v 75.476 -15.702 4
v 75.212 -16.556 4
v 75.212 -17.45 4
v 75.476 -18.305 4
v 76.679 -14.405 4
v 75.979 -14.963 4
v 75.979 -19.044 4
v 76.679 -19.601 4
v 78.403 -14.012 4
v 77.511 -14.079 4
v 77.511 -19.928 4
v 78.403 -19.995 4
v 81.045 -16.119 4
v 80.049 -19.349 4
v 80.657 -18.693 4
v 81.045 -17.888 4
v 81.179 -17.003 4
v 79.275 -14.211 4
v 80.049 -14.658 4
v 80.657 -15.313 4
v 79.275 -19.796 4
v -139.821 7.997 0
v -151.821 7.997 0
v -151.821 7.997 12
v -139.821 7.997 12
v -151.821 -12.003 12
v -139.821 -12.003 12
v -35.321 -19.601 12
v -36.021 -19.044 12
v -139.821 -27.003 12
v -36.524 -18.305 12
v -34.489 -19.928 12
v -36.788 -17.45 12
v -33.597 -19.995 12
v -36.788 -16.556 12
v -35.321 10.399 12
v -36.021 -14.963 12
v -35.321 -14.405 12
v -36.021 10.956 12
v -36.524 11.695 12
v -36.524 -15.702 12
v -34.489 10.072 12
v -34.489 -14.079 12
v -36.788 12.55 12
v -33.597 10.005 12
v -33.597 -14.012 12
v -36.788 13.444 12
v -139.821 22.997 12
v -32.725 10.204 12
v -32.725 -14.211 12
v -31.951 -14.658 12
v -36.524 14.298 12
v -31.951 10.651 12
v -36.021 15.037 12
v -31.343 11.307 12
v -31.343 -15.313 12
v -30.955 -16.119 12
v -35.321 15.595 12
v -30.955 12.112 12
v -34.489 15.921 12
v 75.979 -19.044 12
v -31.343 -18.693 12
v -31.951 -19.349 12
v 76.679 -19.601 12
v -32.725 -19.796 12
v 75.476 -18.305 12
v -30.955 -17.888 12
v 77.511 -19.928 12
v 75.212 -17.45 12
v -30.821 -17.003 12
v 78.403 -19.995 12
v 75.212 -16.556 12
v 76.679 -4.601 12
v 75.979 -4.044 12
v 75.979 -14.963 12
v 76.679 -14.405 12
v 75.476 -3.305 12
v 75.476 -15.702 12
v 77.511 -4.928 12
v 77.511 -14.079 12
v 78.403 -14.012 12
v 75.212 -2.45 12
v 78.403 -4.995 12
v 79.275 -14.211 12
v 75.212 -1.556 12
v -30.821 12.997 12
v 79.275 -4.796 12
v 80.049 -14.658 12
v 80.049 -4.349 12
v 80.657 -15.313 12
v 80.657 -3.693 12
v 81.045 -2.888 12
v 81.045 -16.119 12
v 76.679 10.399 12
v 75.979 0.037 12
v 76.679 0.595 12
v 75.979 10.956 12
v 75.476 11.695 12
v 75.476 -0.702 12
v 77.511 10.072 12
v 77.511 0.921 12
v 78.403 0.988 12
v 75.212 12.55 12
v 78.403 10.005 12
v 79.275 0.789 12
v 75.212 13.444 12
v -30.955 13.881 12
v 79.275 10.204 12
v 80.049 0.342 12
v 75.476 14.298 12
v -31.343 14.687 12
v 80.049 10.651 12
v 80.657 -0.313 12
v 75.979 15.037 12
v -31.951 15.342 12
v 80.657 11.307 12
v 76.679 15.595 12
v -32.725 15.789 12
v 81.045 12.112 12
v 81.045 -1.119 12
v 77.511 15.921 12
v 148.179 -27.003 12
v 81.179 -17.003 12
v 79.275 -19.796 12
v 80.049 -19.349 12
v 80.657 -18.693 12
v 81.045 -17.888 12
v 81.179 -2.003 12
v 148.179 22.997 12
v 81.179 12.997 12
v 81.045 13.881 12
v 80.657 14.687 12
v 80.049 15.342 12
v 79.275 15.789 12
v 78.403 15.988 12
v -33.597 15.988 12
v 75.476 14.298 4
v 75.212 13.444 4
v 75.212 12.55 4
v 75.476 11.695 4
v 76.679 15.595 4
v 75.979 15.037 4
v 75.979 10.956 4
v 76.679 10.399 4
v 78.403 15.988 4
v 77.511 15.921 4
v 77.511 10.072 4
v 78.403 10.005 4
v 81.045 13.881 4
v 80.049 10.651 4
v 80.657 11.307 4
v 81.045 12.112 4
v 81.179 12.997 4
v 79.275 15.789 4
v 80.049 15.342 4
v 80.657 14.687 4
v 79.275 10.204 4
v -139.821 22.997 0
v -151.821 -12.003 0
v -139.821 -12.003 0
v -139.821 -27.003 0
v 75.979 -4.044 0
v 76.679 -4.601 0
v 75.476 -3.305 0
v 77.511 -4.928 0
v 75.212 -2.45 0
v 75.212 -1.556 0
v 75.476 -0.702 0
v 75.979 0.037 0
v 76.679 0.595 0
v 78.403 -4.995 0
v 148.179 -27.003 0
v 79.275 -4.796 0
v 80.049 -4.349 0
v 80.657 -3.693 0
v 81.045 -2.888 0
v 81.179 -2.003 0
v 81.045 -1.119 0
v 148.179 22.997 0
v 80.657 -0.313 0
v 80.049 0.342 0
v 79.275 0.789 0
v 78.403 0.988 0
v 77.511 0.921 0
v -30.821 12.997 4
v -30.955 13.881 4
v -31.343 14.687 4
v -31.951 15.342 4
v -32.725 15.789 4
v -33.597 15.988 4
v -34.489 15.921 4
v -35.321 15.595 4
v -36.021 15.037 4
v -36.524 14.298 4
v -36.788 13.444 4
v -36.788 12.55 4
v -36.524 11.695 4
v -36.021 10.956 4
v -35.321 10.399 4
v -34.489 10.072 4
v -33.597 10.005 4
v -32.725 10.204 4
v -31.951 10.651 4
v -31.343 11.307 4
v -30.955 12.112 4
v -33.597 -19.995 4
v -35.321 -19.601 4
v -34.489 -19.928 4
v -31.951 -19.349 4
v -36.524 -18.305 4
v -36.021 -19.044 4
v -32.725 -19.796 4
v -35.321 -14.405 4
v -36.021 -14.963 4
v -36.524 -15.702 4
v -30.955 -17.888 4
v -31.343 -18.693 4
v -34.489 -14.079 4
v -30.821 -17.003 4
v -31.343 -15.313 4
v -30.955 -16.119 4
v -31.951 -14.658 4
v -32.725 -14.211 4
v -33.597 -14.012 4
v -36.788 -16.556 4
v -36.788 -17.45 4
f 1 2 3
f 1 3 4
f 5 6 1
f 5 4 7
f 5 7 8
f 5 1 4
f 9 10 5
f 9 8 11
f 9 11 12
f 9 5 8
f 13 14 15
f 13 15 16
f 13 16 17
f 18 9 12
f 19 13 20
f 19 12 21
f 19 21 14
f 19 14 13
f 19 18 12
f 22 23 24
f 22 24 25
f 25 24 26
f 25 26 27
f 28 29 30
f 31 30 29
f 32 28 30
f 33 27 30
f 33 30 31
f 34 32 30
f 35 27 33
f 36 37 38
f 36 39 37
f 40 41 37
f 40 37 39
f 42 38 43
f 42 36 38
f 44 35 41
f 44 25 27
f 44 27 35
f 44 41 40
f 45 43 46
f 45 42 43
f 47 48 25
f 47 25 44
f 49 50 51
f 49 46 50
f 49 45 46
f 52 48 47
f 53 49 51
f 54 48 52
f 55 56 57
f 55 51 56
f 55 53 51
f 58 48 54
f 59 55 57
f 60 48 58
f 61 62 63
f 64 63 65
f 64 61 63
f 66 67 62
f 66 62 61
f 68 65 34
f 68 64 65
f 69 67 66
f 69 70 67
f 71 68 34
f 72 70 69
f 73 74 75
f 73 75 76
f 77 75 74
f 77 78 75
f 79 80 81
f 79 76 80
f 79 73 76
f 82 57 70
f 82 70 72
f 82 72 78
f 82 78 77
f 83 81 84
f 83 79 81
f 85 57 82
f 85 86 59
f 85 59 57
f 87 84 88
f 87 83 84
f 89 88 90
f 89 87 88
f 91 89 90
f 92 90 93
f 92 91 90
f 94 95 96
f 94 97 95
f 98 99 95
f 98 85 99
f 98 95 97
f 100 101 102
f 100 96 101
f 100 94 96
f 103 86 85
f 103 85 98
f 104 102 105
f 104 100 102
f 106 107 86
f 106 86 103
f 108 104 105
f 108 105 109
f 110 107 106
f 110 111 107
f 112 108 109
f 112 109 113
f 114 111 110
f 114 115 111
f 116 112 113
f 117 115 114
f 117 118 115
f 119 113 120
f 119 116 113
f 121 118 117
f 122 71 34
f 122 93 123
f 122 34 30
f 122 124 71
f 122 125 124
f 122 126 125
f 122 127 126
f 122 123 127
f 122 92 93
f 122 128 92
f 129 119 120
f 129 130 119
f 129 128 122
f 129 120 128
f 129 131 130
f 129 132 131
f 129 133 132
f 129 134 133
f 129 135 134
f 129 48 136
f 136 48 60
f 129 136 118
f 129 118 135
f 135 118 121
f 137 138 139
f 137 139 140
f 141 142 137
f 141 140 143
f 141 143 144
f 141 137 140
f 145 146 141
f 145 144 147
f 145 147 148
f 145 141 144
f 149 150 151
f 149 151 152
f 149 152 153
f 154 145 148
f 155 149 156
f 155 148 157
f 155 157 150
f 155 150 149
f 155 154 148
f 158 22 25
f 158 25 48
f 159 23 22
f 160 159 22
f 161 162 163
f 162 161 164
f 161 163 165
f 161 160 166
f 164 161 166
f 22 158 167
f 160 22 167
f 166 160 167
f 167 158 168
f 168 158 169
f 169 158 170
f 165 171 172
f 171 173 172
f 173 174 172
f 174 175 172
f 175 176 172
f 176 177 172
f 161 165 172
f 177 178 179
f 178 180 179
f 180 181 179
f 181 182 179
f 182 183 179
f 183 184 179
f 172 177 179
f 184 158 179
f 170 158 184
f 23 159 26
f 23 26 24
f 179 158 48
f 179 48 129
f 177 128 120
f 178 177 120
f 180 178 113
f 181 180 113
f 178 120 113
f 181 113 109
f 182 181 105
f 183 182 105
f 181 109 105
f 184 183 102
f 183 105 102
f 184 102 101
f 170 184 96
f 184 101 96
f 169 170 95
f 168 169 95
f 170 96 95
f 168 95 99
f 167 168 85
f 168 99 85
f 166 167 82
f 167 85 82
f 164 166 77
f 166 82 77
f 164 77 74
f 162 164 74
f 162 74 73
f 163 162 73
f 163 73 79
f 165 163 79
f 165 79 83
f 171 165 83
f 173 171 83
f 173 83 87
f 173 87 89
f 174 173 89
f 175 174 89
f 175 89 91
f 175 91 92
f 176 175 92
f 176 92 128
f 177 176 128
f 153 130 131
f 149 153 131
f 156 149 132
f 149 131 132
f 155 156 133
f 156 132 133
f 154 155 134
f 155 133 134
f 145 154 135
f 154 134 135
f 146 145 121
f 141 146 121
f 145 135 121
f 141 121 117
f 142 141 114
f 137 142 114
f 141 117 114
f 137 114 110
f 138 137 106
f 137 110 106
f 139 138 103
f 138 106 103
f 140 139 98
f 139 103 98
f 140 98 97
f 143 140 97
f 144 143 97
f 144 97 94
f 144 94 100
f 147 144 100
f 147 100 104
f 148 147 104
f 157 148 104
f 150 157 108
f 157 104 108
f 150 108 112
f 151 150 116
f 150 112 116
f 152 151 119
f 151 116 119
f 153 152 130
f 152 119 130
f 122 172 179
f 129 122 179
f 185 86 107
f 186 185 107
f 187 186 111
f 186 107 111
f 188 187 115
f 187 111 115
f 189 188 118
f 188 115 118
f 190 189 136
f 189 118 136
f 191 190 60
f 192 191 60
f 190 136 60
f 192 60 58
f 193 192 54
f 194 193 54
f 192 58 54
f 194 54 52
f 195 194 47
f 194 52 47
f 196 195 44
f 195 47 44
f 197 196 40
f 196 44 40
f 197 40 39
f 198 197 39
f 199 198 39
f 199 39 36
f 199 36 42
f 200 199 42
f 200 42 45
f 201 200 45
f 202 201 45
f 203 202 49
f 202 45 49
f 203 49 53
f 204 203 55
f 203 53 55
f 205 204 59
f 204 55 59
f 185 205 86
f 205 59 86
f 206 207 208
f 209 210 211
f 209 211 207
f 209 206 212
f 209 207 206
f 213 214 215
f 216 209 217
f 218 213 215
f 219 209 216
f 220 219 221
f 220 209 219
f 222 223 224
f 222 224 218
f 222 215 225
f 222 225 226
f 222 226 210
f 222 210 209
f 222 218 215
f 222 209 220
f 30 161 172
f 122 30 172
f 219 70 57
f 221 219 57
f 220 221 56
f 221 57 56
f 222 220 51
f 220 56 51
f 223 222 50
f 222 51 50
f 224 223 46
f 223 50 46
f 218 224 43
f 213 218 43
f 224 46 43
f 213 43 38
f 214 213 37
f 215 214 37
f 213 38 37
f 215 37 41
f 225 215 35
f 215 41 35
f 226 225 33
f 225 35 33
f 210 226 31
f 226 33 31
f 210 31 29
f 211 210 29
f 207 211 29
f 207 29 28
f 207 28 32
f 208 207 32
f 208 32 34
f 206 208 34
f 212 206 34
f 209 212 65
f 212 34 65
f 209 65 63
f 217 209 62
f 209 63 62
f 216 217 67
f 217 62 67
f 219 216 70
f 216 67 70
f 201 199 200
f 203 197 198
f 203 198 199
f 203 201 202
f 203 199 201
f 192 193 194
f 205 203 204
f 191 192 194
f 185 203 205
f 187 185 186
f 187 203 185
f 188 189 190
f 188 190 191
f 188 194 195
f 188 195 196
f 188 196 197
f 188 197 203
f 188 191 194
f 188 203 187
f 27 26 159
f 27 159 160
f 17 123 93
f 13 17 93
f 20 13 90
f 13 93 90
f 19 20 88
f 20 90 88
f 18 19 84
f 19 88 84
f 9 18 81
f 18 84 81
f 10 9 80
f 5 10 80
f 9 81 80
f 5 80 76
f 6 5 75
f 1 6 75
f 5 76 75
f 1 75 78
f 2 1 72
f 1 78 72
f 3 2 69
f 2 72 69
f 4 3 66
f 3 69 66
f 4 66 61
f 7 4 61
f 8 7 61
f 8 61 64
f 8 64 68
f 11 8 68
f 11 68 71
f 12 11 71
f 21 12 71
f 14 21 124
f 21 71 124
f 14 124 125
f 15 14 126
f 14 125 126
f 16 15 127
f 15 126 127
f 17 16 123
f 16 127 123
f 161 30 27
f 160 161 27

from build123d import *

# Parameters (mm, degrees)
F0_W     = 300
F0_H     = 50
F1_DEPTH = 12
F2_W     = 12
F2_H     = 15
F3_DEPTH = 12.5
F4_R     = 3
F5_DEPTH = 8
F6_R     = 3
F7_DEPTH = 12.001


with BuildPart() as f1:
    # F0 (on Top) → F1 (new body)
    with BuildSketch(Plane.XY):
        with Locations((-1.821462065, -2.0033000623)):
            Rectangle(F0_W, F0_H)
    extrude(amount=F1_DEPTH)

    # F2 (on face) → F3 (cut, symmetric)
    with BuildSketch(Plane.XY.offset(12)):
        with Locations((-145.821462065, 15.4966999377)):
            Rectangle(F2_W, F2_H)
        with Locations((-145.821462065, -19.5033000623)):
            Rectangle(F2_W, F2_H)
    extrude(amount=F3_DEPTH, both=True, mode=Mode.SUBTRACT)

    # F4 (on face) → F5 (cut)
    with BuildSketch(Plane.XY.offset(12)):
        with Locations((-33.821462065, -17.0033000623)):
            Circle(F4_R)
        with Locations((78.178537935, 12.9966999377)):
            Circle(F4_R)
        with Locations((78.178537935, -17.0033000623)):
            Circle(F4_R)
        with Locations((-33.821462065, 12.9966999377)):
            Circle(F4_R)
    extrude(amount=-F5_DEPTH, mode=Mode.SUBTRACT)

    # F6 (on face) → F7 (cut, through all)
    with BuildSketch(Plane.XY.offset(12)):
        with Locations((78.178537935, -2.0033000623)):
            Circle(F6_R)
    extrude(amount=-F7_DEPTH, mode=Mode.SUBTRACT)


solid = f1.part
